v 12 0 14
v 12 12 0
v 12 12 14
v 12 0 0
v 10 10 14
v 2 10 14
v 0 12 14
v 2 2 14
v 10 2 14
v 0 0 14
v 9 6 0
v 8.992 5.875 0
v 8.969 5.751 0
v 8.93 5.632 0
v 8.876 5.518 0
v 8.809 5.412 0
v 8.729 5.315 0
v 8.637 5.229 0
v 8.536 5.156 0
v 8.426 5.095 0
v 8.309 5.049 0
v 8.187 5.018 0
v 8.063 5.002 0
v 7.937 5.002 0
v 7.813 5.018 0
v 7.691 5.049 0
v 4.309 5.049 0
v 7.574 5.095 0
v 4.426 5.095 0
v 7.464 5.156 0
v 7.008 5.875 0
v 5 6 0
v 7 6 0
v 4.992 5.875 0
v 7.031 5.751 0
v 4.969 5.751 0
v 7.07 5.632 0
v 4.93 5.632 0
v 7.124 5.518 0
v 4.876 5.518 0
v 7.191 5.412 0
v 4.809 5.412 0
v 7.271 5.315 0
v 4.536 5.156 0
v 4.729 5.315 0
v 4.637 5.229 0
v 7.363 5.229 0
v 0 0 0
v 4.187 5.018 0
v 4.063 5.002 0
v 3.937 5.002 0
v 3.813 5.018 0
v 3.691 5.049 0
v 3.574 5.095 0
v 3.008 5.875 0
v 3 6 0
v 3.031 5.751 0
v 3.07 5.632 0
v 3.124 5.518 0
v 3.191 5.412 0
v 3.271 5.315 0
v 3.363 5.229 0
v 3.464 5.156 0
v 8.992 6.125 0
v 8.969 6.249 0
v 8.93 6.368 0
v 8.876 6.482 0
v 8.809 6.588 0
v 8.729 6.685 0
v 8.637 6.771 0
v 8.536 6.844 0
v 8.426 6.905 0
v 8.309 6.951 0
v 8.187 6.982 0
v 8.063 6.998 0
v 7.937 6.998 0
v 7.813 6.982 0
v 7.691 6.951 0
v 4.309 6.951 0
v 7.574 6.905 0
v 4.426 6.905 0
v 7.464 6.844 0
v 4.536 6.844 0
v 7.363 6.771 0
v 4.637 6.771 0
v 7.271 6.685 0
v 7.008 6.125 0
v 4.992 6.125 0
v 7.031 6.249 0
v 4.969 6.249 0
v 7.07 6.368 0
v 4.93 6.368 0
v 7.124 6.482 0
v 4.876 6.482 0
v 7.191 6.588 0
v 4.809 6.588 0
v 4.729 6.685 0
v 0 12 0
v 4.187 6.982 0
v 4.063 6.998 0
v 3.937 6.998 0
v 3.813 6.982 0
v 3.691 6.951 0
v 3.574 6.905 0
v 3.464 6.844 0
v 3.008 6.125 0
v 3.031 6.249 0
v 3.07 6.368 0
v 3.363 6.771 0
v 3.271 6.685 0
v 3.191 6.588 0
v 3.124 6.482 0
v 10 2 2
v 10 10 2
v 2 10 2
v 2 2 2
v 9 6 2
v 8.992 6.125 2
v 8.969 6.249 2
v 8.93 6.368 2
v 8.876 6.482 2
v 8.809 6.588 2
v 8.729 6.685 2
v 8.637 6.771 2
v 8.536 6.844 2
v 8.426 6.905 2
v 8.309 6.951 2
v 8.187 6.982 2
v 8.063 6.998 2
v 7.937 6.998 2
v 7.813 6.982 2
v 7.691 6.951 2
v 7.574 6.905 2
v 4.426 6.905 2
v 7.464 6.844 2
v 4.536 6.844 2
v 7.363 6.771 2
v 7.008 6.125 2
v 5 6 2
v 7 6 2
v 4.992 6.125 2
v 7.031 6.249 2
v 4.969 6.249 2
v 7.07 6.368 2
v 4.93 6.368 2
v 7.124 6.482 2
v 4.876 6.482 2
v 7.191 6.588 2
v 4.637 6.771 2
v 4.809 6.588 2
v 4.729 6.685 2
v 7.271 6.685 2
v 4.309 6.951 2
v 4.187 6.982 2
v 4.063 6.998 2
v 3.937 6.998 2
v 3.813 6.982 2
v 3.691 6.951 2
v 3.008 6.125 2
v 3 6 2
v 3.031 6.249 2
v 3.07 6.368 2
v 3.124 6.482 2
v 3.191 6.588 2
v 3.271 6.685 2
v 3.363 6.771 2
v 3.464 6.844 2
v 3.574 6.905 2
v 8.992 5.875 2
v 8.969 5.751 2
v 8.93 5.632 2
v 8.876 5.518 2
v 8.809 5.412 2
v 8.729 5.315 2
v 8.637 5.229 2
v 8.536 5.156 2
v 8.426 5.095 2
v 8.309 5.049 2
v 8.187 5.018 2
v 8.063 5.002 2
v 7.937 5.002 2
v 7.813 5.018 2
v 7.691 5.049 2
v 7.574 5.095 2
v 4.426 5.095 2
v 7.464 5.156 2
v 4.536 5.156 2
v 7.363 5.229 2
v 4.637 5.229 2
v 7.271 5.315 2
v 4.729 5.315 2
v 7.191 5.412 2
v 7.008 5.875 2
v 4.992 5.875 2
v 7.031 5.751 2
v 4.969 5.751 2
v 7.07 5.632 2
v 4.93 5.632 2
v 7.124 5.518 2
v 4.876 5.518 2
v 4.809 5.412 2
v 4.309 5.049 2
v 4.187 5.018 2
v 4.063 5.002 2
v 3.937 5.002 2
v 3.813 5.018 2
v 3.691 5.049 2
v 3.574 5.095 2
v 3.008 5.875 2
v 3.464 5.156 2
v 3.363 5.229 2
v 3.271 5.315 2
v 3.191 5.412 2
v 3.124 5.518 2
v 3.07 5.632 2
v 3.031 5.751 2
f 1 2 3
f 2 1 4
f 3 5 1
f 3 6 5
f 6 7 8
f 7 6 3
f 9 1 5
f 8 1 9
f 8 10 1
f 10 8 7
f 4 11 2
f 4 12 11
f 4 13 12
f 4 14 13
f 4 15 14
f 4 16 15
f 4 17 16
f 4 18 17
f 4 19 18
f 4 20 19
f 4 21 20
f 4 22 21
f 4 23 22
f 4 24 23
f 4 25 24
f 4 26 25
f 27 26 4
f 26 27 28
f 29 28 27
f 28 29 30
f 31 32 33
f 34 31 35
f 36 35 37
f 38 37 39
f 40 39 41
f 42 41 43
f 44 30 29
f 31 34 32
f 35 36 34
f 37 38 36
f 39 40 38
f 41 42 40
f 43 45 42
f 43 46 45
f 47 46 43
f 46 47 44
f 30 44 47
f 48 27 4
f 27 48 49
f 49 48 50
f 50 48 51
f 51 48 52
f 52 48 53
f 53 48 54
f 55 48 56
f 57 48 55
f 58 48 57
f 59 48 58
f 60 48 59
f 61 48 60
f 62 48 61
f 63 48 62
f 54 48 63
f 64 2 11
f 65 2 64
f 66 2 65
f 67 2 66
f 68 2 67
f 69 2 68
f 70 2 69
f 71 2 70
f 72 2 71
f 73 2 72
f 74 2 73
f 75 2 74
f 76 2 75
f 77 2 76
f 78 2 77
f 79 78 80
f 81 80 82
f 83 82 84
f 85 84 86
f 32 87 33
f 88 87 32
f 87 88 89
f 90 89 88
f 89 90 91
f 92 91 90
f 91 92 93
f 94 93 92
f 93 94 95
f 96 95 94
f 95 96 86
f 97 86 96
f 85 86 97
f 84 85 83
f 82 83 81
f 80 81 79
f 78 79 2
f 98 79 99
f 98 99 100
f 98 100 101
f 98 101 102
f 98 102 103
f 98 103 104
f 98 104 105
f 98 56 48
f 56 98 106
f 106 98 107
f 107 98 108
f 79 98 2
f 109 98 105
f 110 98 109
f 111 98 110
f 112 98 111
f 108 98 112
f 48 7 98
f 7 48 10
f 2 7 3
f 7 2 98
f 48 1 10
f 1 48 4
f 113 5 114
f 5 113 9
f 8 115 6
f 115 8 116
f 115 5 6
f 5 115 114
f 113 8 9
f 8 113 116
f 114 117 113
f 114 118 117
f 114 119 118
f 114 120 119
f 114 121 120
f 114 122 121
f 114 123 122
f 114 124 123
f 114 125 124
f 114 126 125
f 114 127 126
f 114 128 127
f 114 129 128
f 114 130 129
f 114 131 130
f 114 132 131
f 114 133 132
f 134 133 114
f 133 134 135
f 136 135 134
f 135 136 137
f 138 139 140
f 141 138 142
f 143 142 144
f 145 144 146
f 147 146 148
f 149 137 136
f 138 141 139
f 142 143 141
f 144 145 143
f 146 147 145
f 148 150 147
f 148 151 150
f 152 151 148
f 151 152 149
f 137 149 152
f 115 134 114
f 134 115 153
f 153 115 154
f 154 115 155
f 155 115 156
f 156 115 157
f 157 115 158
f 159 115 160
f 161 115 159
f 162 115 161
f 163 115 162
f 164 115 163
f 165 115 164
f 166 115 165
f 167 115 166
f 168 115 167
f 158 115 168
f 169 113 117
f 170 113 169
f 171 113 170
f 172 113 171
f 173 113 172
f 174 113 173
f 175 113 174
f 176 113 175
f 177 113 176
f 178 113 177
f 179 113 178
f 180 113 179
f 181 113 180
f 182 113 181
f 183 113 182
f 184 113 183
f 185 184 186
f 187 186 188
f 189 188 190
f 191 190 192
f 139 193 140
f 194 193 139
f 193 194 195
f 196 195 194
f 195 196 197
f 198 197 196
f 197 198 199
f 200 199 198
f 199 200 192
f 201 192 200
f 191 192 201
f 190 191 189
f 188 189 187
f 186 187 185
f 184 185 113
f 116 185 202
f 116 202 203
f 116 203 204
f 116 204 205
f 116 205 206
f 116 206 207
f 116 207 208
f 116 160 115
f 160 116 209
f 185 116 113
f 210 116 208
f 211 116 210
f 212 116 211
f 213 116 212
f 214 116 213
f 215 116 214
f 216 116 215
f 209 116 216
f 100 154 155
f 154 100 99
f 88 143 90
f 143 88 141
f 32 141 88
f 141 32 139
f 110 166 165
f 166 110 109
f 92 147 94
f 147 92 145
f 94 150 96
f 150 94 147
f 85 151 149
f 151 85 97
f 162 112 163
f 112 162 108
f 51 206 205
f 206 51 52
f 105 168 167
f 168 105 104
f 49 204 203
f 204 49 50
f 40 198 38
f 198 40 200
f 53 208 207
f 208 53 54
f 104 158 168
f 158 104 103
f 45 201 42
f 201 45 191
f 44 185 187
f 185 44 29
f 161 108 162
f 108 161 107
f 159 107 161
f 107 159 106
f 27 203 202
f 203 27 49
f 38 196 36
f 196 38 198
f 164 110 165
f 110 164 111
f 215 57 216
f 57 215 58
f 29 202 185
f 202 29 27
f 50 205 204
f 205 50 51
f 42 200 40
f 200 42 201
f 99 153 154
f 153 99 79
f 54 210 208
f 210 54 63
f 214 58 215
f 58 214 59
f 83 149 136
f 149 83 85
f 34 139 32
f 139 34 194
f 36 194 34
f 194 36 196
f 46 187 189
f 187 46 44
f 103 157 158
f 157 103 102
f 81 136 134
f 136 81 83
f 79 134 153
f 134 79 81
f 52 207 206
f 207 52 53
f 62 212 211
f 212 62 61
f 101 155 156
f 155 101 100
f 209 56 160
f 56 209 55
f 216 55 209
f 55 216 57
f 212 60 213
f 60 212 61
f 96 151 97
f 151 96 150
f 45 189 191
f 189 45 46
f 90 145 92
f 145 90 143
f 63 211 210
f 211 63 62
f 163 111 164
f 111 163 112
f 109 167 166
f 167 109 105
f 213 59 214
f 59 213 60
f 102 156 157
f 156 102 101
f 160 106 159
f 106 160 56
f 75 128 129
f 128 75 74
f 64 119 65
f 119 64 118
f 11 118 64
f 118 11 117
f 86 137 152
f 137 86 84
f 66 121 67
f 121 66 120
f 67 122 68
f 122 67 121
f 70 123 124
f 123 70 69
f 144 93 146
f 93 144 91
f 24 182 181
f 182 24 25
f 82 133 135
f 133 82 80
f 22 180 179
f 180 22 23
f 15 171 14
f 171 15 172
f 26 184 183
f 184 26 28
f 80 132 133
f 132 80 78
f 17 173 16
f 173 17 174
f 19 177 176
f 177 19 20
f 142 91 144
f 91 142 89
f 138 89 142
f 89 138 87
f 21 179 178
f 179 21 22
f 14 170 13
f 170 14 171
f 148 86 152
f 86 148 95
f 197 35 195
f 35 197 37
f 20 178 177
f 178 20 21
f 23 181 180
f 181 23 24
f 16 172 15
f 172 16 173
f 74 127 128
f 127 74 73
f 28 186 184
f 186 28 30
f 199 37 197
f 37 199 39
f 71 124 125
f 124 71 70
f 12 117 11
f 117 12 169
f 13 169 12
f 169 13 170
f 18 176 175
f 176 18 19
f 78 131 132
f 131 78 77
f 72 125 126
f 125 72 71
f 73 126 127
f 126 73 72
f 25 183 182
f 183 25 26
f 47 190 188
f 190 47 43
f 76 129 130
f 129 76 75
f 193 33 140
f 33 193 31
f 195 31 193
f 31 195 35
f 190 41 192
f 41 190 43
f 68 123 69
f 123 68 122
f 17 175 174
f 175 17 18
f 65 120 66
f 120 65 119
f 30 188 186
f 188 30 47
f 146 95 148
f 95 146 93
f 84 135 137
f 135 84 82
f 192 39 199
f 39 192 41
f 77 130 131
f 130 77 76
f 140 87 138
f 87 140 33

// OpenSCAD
$fn = 50;

difference() {
	cube([12, 12, 14]);	
	translate([2, 2, 0]) cube([8, 8, 14]);	
}

difference() {
	cube([12, 12, 2]);	
	translate([4, 6, 0]) cylinder(r = 1, h = 20);
	translate([8, 6, 0]) cylinder(r = 1, h = 20);
}
